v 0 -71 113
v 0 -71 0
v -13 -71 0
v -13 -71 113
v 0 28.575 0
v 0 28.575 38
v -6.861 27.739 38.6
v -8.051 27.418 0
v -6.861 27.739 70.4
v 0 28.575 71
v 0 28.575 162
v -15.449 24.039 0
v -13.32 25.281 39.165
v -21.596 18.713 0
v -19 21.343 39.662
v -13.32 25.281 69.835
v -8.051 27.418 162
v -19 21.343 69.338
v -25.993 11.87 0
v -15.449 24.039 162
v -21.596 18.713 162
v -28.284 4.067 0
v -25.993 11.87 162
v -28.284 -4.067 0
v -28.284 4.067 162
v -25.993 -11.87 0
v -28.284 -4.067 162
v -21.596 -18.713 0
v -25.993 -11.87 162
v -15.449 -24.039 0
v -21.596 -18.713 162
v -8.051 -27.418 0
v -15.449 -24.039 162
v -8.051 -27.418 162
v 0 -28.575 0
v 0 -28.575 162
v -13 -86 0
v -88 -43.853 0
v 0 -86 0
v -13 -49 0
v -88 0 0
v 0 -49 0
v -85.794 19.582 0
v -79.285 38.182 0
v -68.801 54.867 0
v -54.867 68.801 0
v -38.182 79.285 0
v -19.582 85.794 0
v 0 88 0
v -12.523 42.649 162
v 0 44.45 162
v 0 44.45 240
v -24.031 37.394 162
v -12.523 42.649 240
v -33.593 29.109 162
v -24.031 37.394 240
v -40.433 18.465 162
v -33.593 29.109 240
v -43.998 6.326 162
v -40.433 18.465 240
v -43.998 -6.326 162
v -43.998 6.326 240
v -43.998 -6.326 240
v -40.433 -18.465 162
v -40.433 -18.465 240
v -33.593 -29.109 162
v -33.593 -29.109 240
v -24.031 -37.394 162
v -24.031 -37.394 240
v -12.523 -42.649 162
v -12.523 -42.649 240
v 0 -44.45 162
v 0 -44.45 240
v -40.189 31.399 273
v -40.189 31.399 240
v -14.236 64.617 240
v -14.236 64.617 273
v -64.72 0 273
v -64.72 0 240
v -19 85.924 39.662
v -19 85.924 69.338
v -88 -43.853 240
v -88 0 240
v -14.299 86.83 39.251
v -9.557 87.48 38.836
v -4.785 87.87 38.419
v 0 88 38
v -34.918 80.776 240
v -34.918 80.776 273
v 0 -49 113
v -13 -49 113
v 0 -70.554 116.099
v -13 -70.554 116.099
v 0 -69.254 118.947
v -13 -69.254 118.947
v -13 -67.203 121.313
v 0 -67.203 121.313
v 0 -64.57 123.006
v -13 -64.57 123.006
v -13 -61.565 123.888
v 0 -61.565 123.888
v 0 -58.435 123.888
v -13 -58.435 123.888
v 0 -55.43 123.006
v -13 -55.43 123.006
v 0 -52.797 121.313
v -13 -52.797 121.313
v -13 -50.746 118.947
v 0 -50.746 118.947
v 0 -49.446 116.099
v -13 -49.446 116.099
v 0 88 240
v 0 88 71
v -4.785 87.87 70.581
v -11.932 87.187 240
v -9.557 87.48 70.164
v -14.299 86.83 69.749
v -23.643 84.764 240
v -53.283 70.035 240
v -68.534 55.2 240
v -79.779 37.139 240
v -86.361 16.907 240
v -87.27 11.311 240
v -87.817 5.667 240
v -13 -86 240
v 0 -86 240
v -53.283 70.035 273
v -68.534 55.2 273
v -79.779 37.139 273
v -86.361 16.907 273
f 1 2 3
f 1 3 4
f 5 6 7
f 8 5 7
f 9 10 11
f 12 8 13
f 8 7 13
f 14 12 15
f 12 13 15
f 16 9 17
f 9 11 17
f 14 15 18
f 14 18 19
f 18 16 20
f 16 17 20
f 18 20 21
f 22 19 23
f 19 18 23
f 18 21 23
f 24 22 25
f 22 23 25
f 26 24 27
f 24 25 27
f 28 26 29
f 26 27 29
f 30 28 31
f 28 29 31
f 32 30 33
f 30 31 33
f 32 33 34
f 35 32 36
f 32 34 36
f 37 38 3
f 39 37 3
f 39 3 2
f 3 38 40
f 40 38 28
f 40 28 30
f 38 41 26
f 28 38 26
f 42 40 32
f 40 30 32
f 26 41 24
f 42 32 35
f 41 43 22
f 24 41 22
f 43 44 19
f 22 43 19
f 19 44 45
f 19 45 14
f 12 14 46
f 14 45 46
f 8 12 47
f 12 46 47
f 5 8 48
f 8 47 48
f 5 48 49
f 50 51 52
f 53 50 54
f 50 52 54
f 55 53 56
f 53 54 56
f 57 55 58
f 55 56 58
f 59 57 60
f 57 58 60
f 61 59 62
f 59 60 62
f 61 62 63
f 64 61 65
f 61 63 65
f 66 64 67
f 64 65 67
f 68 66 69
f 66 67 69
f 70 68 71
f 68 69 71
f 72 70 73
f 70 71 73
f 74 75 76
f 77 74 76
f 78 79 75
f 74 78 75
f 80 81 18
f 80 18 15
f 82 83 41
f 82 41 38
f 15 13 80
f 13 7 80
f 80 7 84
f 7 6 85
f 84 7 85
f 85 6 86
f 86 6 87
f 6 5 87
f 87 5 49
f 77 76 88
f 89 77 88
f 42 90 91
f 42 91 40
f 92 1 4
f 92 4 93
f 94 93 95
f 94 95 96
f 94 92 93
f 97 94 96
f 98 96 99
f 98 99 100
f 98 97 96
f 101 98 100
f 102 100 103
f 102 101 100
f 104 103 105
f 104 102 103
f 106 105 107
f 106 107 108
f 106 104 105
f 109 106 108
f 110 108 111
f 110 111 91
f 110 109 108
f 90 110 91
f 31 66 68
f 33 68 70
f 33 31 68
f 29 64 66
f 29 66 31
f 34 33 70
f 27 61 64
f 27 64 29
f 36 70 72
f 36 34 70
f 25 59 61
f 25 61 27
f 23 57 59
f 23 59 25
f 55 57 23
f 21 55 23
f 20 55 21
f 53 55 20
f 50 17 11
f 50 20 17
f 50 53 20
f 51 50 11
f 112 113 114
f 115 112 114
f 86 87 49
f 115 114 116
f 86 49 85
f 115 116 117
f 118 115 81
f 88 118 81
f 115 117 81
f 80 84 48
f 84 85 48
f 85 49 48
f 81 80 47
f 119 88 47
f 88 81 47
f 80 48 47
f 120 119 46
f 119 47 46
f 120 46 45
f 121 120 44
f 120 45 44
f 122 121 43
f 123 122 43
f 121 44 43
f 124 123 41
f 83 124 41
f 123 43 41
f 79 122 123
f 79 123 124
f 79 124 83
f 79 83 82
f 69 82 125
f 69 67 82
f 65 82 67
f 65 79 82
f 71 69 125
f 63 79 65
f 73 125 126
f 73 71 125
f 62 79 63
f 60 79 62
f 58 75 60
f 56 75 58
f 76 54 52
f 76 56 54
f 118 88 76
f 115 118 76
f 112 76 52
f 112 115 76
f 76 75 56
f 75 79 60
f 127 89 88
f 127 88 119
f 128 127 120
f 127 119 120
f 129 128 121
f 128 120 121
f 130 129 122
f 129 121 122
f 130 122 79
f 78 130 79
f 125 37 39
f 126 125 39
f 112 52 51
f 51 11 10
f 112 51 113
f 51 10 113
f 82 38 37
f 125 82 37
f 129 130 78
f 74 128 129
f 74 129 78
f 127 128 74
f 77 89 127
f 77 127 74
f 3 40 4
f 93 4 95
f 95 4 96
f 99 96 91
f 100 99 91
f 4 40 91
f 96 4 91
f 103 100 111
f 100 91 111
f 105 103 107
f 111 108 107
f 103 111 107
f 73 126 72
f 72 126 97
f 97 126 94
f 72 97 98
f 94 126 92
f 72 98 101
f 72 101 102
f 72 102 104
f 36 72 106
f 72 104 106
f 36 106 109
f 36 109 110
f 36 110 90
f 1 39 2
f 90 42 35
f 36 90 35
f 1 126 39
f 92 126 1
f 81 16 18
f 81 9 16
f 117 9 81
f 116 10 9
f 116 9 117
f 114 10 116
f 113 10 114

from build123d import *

# Parameters (mm, degrees)
BOSS_EXTRU_1_DEPTH      = 240
ESQUISSE2_R             = 44.45
ENL_V_MAT_EXTRU_1_DEPTH = 78
ESQUISSE3_R             = 28.575
ENL_V_MAT_EXTRU_2_DEPTH = 205.284115878
BOSS_EXTRU_4_DEPTH      = 33
ESQUISSE8_W             = 33
ESQUISSE8_H             = 90
ENL_V_MAT_EXTRU_4_DEPTH = 19
ENL_V_MAT_EXTRU_4_DRAFT = -5
ENL_V_MAT_EXTRU_5_DEPTH = 13


with BuildPart() as part:
    # Esquisse1 → Boss.-Extru.1 (new body)
    with BuildSketch(Plane.XY):
        with BuildLine():
            Line((0, -86), (0, 88))
            ThreePointArc((0, 88), (-62.225396744, 62.225396744), (-88, 0))
            Line((-88, 0), (-88, -43.853430349))
            Line((-88, -43.853430349), (-13, -86))
            Line((-13, -86), (0, -86))
        make_face()
    extrude(amount=BOSS_EXTRU_1_DEPTH)

    # Esquisse2 → Enlèv. mat.-Extru.1 (cut)
    with BuildSketch(Plane.XY.offset(240)):
        Circle(ESQUISSE2_R)
    extrude(amount=-ENL_V_MAT_EXTRU_1_DEPTH, mode=Mode.SUBTRACT)

    # Esquisse3 → Enlèv. mat.-Extru.2 (cut, through all)
    with BuildSketch(Plane.XY.offset(162)):
        Circle(ESQUISSE3_R)
    extrude(amount=-ENL_V_MAT_EXTRU_2_DEPTH, mode=Mode.SUBTRACT)

    # Esquisse7 → Boss.-Extru.4 (add)
    with BuildSketch(Plane.XY.offset(240)):
        with BuildLine():
            Line((-64.719928969, 0), (-40.188548434, 31.398735242))
            Line((-40.188548434, 31.398735242), (-14.235687992, 64.616881796))
            Line((-14.235687992, 64.616881796), (-34.918120487, 80.775769025))
            ThreePointArc((-34.918120487, 80.775769025), (-68.534051615, 55.20039646), (-86.360508015, 16.907473358))
            Line((-86.360508015, 16.907473358), (-64.719928969, 0))
        make_face()
    extrude(amount=BOSS_EXTRU_4_DEPTH)


with BuildPart() as enl_v_mat_extru_4_tool:
    # Esquisse8 → Enlèv. mat.-Extru.4 (with draft: the straight prism first)
    with BuildSketch(Plane(origin=(0, 0, 0), x_dir=(0, 0, -1), z_dir=(1, 0, 0))):
        with Locations((-54.5, 49.335999727)):
            Rectangle(ESQUISSE8_W, ESQUISSE8_H)
    extrude(amount=-ENL_V_MAT_EXTRU_4_DEPTH)
    # Enlèv. mat.-Extru.4: the draft: its side faces are tilted about the plane it starts from
    enl_v_mat_extru_4_sides = [enl_v_mat_extru_4_tool.faces().sort_by_distance(p)[0] for p in [
        (-9.5, 49.335999727, 71),
        (-9.5, 4.335999727, 54.5),
        (-9.5, 49.335999727, 38),
        (-9.5, 94.335999727, 54.5),
    ]]
    draft(enl_v_mat_extru_4_sides, Plane(origin=(0, 0, 0), x_dir=(0, 0, -1), z_dir=(1, 0, 0)), ENL_V_MAT_EXTRU_4_DRAFT)


with BuildPart() as part_1:
    add(part.part)

    # Enlèv. mat.-Extru.4: cut by enl_v_mat_extru_4_tool
    add(enl_v_mat_extru_4_tool.part, mode=Mode.SUBTRACT)

    # Esquisse9 → Enlèv. mat.-Extru.5 (cut)
    with BuildSketch(Plane(origin=(0, 0, 0), x_dir=(0, 0, -1), z_dir=(1, 0, 0))):
        with BuildLine():
            Line((-113, -49), (0, -49))
            Line((0, -49), (0, -71))
            Line((0, -71), (-113, -71))
            ThreePointArc((-113, -71), (-124, -60), (-113, -49))
        make_face()
    extrude(amount=-ENL_V_MAT_EXTRU_5_DEPTH, mode=Mode.SUBTRACT)


solid = part_1.part
